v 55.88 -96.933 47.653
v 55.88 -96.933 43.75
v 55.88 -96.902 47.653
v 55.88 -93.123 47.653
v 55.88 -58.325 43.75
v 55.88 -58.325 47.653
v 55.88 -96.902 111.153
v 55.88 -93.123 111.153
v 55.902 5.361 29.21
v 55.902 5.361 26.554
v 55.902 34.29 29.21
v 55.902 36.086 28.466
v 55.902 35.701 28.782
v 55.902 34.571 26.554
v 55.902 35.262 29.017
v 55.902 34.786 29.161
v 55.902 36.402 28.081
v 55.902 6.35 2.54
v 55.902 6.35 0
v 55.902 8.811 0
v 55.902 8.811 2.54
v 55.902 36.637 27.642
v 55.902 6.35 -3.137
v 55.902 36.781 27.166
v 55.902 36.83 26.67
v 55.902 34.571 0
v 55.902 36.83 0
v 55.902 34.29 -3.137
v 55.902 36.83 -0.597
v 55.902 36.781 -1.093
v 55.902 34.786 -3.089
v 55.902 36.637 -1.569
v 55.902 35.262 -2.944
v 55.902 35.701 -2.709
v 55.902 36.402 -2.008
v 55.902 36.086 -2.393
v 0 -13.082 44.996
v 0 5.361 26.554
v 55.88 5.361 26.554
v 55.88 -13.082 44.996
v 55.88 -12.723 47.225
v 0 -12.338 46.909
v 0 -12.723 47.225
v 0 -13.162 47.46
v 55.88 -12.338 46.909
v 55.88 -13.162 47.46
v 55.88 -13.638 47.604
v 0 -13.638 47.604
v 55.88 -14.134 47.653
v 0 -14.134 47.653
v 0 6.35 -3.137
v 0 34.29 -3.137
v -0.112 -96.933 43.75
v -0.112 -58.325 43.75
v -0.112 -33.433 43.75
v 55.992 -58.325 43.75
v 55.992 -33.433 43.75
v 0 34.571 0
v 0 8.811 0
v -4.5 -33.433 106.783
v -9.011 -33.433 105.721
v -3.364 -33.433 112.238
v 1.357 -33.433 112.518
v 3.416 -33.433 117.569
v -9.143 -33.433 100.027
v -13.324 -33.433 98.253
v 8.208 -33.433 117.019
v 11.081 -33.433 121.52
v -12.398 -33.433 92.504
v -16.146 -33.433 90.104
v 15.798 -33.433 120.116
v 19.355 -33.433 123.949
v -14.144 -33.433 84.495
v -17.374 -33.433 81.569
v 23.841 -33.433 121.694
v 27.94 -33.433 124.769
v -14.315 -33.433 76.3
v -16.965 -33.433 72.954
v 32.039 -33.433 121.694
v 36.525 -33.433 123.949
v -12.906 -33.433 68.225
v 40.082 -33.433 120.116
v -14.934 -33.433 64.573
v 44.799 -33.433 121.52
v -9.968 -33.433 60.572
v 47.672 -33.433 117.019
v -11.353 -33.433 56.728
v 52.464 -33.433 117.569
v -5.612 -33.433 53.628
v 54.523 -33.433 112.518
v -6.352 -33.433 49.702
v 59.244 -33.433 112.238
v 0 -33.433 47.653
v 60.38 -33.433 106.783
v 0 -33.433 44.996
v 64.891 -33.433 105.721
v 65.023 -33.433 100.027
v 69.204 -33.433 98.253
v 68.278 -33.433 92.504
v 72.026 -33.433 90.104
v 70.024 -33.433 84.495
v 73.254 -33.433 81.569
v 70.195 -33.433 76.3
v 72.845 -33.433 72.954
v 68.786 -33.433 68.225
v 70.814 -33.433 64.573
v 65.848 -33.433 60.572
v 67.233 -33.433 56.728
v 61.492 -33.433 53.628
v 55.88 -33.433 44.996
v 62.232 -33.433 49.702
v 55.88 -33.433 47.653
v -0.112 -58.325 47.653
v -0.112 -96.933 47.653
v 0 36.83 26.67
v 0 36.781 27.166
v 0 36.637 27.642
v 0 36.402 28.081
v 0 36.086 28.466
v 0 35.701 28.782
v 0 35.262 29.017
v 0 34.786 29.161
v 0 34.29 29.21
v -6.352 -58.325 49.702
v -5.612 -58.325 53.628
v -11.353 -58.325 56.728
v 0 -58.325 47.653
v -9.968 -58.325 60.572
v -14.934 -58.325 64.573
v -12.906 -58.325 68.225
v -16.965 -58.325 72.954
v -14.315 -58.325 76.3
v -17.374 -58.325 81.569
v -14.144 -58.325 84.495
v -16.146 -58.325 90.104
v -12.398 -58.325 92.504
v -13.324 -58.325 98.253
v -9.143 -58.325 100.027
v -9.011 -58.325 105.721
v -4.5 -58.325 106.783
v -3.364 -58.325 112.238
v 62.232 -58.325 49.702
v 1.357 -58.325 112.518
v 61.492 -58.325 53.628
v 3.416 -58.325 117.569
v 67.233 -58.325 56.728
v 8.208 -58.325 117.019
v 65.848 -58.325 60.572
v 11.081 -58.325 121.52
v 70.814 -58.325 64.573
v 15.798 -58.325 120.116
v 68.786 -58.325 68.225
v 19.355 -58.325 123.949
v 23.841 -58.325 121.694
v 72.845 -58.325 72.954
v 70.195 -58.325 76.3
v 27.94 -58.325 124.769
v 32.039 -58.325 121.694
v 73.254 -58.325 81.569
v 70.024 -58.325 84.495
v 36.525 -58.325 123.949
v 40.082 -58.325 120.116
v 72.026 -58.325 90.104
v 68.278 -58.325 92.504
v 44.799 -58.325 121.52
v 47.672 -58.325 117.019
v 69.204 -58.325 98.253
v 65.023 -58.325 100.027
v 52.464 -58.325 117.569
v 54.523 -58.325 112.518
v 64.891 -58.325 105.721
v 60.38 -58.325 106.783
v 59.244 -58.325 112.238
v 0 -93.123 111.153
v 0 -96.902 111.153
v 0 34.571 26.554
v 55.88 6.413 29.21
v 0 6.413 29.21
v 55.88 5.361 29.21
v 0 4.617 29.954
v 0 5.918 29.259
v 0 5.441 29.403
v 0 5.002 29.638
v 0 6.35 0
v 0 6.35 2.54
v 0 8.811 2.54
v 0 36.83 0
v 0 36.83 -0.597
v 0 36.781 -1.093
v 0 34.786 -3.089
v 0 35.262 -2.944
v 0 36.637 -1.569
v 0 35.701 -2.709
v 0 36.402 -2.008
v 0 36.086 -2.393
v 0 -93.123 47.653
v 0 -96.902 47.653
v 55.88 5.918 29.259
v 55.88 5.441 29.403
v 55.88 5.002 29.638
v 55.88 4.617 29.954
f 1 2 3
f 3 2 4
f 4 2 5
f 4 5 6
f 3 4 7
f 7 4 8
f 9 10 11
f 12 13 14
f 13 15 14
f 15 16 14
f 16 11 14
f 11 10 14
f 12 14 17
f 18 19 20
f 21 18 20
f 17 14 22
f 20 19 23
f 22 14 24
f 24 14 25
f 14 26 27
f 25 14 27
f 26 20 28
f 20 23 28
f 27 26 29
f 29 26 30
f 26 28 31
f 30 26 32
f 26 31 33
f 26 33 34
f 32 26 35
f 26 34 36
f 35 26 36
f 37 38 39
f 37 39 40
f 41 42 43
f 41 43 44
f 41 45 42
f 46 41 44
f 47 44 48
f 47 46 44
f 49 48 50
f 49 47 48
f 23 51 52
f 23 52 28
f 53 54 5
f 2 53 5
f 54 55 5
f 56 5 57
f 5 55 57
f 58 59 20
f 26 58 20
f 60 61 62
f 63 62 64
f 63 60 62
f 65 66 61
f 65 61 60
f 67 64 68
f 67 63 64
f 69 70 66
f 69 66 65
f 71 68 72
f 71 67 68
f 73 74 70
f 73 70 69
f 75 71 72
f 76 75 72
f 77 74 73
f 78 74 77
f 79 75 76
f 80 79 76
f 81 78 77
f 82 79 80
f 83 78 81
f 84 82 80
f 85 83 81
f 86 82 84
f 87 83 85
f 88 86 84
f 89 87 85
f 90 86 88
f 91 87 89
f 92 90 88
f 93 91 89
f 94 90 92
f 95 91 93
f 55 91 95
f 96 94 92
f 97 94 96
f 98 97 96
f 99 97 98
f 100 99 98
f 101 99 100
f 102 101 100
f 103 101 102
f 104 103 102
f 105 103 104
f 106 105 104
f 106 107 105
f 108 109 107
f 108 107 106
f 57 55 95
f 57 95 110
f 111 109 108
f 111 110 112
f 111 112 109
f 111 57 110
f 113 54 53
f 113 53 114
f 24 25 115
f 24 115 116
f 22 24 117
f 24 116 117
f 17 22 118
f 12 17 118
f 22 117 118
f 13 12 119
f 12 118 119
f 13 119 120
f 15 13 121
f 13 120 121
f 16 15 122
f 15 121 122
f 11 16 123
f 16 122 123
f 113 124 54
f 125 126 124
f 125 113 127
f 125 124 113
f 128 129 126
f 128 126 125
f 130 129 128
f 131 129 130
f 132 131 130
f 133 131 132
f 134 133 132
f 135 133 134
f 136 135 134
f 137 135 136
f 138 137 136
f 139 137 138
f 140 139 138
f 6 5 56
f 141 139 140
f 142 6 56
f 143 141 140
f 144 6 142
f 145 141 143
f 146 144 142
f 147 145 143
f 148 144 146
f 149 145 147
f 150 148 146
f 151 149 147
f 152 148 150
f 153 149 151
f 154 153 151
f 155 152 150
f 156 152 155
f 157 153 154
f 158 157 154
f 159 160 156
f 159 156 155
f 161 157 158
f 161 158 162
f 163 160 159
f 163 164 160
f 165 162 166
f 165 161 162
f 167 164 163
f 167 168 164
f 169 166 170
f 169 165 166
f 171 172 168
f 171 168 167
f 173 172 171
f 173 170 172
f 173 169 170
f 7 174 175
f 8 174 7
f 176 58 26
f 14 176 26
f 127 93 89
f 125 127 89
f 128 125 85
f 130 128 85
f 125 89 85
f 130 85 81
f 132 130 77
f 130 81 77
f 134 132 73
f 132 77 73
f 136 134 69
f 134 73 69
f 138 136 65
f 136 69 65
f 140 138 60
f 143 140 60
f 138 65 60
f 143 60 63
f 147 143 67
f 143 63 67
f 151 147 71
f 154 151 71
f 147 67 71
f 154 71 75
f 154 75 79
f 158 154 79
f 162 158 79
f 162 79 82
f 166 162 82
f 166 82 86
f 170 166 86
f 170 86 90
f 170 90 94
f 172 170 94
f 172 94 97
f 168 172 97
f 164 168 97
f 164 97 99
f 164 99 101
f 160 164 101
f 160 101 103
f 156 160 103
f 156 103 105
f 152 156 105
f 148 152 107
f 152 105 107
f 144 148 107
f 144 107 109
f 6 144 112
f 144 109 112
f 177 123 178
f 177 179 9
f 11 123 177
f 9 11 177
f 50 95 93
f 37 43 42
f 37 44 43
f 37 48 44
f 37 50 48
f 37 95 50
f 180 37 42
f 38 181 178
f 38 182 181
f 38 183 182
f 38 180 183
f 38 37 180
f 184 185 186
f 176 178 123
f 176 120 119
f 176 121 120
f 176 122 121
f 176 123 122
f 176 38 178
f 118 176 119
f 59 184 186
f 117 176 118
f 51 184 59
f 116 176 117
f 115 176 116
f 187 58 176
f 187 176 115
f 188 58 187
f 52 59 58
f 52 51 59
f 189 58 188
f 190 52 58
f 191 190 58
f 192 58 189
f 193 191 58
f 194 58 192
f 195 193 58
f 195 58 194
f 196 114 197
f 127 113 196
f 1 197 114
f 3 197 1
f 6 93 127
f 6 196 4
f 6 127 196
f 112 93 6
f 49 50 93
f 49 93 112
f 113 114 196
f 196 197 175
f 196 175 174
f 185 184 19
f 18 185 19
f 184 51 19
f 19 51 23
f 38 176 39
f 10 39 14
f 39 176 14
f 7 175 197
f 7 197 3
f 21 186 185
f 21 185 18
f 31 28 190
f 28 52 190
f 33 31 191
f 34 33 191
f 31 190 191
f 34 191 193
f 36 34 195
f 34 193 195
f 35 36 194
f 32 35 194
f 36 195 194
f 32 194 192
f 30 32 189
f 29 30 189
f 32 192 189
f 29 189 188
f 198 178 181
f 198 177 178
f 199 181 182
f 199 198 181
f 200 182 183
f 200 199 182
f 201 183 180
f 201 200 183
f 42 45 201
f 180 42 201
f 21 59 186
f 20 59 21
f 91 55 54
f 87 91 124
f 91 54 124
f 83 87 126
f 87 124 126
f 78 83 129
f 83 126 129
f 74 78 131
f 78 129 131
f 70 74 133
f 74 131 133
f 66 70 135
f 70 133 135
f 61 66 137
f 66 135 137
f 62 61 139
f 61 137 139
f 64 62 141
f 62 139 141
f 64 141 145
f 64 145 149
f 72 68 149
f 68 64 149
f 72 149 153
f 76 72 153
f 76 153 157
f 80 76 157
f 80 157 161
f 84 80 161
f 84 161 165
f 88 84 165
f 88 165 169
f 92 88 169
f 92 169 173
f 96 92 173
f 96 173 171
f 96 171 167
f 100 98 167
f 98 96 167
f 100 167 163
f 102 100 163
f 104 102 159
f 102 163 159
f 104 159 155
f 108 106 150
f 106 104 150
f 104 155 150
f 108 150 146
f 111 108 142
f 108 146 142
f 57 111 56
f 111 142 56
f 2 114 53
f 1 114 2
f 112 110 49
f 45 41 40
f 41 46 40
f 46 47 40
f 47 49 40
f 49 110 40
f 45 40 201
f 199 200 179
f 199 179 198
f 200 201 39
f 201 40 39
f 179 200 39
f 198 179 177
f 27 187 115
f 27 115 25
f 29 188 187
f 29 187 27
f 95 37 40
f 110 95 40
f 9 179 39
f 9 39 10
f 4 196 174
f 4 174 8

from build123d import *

# Parameters (mm, degrees)
SKETCH2_W            = 55.901800272
SKETCH2_H            = 3.137316852
BOSS_EXTRUDE1_DEPTH  = 36.83
SKETCH3_W            = 55.901800272
SKETCH3_H            = 2.258710987
BOSS_EXTRUDE2_DEPTH  = 29.21
SKETCH4_W            = 55.901800272
SKETCH4_H            = 2.656475696
BOSS_EXTRUDE3_DEPTH  = 29.21
BOSS_EXTRUDE4_DEPTH  = 55.88
SKETCH7_W            = 55.88
SKETCH7_H            = 2.656475696
BOSS_EXTRUDE5_DEPTH  = 83.82
SKETCH8_W            = 55.88
SKETCH8_H            = 3.77839036
BOSS_EXTRUDE6_DEPTH  = 63.5
SKETCH18_W           = 55.901800272
SKETCH18_H           = 2.413327827
BOSS_EXTRUDE9_DEPTH  = 3.81
SKETCH20_R           = 45.365929921
BOSS_EXTRUDE10_DEPTH = 59.69
CUT_EXTRUDE2_DEPTH   = 59.69
CUT_EXTRUDE4_DEPTH   = 59.69
SKETCH23_R           = 50.619817538
CUT_EXTRUDE5_DEPTH   = 34.798
SKETCH24_W           = 55.992252849
SKETCH24_H           = 3.903032237
BOSS_EXTRUDE11_DEPTH = 38.608
SKETCH25_W           = 55.901800272
SKETCH25_H           = 6.947316852
CUT_EXTRUDE6_DEPTH   = 6.35
SKETCH26_W           = 55.901800272
SKETCH26_H           = 2.460794709
BOSS_EXTRUDE12_DEPTH = 2.54
FILLET2_R            = 2.54
FILLET4_R            = 2.54
FILLET5_R            = 2.54


with BuildPart() as part:
    # Sketch2 → Boss-Extrude1 (new body)
    with BuildSketch(Plane(origin=(0, 0, 0), x_dir=(1, 0, 0), z_dir=(0, 1, 0))):
        with Locations((27.950900136, 1.568658426)):
            Rectangle(SKETCH2_W, SKETCH2_H)
    extrude(amount=BOSS_EXTRUDE1_DEPTH)

    # Sketch3 → Boss-Extrude2 (add)
    with BuildSketch(Plane.XY):
        with Locations((27.950900136, 35.700644507)):
            Rectangle(SKETCH3_W, SKETCH3_H)
    extrude(amount=BOSS_EXTRUDE2_DEPTH)

    # Sketch4 → Boss-Extrude3 (add)
    with BuildSketch(Plane.XZ.offset(-34.571289013)):
        with Locations((27.950900136, 27.881762152)):
            Rectangle(SKETCH4_W, SKETCH4_H)
    extrude(amount=BOSS_EXTRUDE3_DEPTH)

    # Sketch6 → Boss-Extrude4 (add)
    with BuildSketch(Plane.ZY):
        Polygon((29.21, 5.361289013), (29.21, 8.93281191), (29.21, 36.83), (-3.137316852, 36.83), (-3.137316852, 0), (0, 0), (0, 34.571289013), (26.553524304, 34.571289013), (26.553524304, 5.361289013), (44.996482377, -13.08166906), (47.652958073, -13.08166906), align=None)
    extrude(amount=-BOSS_EXTRUDE4_DEPTH)

    # Sketch7 → Boss-Extrude5 (add)
    with BuildSketch(Plane.XZ.offset(13.08166906)):
        with Locations((27.94, 46.324720225)):
            Rectangle(SKETCH7_W, SKETCH7_H)
    extrude(amount=BOSS_EXTRUDE5_DEPTH)

    # Sketch8 → Boss-Extrude6 (add)
    with BuildSketch(Plane.XY.offset(47.652958073)):
        with Locations((27.94, -95.01247388)):
            Rectangle(SKETCH8_W, SKETCH8_H)
    extrude(amount=BOSS_EXTRUDE6_DEPTH)

    # Sketch18 → Boss-Extrude9 (add)
    with BuildSketch(Plane.XY):
        with Locations((27.950900136, 1.206663914)):
            Rectangle(SKETCH18_W, SKETCH18_H)
    extrude(amount=BOSS_EXTRUDE9_DEPTH)

    # Sketch20 → Boss-Extrude10 (add)
    with BuildSketch(Plane(origin=(0, -93.1232787, 0), x_dir=(1, 0, 0), z_dir=(0, 1, 0))):
        with Locations((27.94, -79.402958073)):
            Circle(SKETCH20_R)
    extrude(amount=BOSS_EXTRUDE10_DEPTH)

    # Sketch21 → Cut-Extrude2 (cut)
    with BuildSketch(Plane(origin=(0, -33.4332787, 0), x_dir=(1, 0, 0), z_dir=(0, 1, 0))):
        with BuildLine():
            Line((55.88, -47.652958073), (0, -47.652958073))
            ThreePointArc((0, -47.652958073), (27.94, -121.892938161), (55.88, -47.652958073))
        make_face()
    extrude(amount=-CUT_EXTRUDE2_DEPTH, mode=Mode.SUBTRACT)

    # Sketch22 → Cut-Extrude4 (cut)
    with BuildSketch(Plane(origin=(0, -33.4332787, 0), x_dir=(1, 0, 0), z_dir=(0, 1, 0))):
        Polygon((-0.112252849, -43.749925836), (55.992252849, -43.749925836), (52.485687981, -29.879615978), (-0.112252849, -30.827478948), align=None)
    extrude(amount=-CUT_EXTRUDE4_DEPTH, mode=Mode.SUBTRACT)

    # Sketch23 → Cut-Extrude5 (cut)
    with BuildSketch(Plane.XZ.offset(93.1232787)):
        with Locations((27.94, 84.259406915)):
            Circle(SKETCH23_R)
    extrude(amount=-CUT_EXTRUDE5_DEPTH, mode=Mode.SUBTRACT)

    # Sketch24 → Boss-Extrude11 (add)
    with BuildSketch(Plane.XZ.offset(58.3252787)):
        with Locations((27.883873576, 45.701441954)):
            Rectangle(SKETCH24_W, SKETCH24_H)
    extrude(amount=BOSS_EXTRUDE11_DEPTH)

    # Sketch25 → Cut-Extrude6 (cut)
    with BuildSketch(Plane.XZ):
        with Locations((27.950900136, 0.336341574)):
            Rectangle(SKETCH25_W, SKETCH25_H)
    extrude(amount=-CUT_EXTRUDE6_DEPTH, mode=Mode.SUBTRACT)

    # Sketch26 → Boss-Extrude12 (add)
    with BuildSketch(Plane.XY):
        with Locations((27.950900136, 7.580397355)):
            Rectangle(SKETCH26_W, SKETCH26_H)
    extrude(amount=BOSS_EXTRUDE12_DEPTH)

    # Fillet2
    fillet2_edges = [part.edges().sort_by_distance(p)[0] for p in [
        (27.950900136, 36.83, -3.137316852),
        (27.950900136, 36.83, 29.21),
    ]]
    fillet(fillet2_edges, radius=FILLET2_R)

    # Fillet4
    fillet4_edges = [part.edges().sort_by_distance(p)[0] for p in [
        (27.94, 5.361289013, 29.21),
    ]]
    fillet(fillet4_edges, radius=FILLET4_R)

    # Fillet5
    fillet5_edges = [part.edges().sort_by_distance(p)[0] for p in [
        (27.94, -13.08166906, 47.652958073),
    ]]
    fillet(fillet5_edges, radius=FILLET5_R)


solid = part.part
